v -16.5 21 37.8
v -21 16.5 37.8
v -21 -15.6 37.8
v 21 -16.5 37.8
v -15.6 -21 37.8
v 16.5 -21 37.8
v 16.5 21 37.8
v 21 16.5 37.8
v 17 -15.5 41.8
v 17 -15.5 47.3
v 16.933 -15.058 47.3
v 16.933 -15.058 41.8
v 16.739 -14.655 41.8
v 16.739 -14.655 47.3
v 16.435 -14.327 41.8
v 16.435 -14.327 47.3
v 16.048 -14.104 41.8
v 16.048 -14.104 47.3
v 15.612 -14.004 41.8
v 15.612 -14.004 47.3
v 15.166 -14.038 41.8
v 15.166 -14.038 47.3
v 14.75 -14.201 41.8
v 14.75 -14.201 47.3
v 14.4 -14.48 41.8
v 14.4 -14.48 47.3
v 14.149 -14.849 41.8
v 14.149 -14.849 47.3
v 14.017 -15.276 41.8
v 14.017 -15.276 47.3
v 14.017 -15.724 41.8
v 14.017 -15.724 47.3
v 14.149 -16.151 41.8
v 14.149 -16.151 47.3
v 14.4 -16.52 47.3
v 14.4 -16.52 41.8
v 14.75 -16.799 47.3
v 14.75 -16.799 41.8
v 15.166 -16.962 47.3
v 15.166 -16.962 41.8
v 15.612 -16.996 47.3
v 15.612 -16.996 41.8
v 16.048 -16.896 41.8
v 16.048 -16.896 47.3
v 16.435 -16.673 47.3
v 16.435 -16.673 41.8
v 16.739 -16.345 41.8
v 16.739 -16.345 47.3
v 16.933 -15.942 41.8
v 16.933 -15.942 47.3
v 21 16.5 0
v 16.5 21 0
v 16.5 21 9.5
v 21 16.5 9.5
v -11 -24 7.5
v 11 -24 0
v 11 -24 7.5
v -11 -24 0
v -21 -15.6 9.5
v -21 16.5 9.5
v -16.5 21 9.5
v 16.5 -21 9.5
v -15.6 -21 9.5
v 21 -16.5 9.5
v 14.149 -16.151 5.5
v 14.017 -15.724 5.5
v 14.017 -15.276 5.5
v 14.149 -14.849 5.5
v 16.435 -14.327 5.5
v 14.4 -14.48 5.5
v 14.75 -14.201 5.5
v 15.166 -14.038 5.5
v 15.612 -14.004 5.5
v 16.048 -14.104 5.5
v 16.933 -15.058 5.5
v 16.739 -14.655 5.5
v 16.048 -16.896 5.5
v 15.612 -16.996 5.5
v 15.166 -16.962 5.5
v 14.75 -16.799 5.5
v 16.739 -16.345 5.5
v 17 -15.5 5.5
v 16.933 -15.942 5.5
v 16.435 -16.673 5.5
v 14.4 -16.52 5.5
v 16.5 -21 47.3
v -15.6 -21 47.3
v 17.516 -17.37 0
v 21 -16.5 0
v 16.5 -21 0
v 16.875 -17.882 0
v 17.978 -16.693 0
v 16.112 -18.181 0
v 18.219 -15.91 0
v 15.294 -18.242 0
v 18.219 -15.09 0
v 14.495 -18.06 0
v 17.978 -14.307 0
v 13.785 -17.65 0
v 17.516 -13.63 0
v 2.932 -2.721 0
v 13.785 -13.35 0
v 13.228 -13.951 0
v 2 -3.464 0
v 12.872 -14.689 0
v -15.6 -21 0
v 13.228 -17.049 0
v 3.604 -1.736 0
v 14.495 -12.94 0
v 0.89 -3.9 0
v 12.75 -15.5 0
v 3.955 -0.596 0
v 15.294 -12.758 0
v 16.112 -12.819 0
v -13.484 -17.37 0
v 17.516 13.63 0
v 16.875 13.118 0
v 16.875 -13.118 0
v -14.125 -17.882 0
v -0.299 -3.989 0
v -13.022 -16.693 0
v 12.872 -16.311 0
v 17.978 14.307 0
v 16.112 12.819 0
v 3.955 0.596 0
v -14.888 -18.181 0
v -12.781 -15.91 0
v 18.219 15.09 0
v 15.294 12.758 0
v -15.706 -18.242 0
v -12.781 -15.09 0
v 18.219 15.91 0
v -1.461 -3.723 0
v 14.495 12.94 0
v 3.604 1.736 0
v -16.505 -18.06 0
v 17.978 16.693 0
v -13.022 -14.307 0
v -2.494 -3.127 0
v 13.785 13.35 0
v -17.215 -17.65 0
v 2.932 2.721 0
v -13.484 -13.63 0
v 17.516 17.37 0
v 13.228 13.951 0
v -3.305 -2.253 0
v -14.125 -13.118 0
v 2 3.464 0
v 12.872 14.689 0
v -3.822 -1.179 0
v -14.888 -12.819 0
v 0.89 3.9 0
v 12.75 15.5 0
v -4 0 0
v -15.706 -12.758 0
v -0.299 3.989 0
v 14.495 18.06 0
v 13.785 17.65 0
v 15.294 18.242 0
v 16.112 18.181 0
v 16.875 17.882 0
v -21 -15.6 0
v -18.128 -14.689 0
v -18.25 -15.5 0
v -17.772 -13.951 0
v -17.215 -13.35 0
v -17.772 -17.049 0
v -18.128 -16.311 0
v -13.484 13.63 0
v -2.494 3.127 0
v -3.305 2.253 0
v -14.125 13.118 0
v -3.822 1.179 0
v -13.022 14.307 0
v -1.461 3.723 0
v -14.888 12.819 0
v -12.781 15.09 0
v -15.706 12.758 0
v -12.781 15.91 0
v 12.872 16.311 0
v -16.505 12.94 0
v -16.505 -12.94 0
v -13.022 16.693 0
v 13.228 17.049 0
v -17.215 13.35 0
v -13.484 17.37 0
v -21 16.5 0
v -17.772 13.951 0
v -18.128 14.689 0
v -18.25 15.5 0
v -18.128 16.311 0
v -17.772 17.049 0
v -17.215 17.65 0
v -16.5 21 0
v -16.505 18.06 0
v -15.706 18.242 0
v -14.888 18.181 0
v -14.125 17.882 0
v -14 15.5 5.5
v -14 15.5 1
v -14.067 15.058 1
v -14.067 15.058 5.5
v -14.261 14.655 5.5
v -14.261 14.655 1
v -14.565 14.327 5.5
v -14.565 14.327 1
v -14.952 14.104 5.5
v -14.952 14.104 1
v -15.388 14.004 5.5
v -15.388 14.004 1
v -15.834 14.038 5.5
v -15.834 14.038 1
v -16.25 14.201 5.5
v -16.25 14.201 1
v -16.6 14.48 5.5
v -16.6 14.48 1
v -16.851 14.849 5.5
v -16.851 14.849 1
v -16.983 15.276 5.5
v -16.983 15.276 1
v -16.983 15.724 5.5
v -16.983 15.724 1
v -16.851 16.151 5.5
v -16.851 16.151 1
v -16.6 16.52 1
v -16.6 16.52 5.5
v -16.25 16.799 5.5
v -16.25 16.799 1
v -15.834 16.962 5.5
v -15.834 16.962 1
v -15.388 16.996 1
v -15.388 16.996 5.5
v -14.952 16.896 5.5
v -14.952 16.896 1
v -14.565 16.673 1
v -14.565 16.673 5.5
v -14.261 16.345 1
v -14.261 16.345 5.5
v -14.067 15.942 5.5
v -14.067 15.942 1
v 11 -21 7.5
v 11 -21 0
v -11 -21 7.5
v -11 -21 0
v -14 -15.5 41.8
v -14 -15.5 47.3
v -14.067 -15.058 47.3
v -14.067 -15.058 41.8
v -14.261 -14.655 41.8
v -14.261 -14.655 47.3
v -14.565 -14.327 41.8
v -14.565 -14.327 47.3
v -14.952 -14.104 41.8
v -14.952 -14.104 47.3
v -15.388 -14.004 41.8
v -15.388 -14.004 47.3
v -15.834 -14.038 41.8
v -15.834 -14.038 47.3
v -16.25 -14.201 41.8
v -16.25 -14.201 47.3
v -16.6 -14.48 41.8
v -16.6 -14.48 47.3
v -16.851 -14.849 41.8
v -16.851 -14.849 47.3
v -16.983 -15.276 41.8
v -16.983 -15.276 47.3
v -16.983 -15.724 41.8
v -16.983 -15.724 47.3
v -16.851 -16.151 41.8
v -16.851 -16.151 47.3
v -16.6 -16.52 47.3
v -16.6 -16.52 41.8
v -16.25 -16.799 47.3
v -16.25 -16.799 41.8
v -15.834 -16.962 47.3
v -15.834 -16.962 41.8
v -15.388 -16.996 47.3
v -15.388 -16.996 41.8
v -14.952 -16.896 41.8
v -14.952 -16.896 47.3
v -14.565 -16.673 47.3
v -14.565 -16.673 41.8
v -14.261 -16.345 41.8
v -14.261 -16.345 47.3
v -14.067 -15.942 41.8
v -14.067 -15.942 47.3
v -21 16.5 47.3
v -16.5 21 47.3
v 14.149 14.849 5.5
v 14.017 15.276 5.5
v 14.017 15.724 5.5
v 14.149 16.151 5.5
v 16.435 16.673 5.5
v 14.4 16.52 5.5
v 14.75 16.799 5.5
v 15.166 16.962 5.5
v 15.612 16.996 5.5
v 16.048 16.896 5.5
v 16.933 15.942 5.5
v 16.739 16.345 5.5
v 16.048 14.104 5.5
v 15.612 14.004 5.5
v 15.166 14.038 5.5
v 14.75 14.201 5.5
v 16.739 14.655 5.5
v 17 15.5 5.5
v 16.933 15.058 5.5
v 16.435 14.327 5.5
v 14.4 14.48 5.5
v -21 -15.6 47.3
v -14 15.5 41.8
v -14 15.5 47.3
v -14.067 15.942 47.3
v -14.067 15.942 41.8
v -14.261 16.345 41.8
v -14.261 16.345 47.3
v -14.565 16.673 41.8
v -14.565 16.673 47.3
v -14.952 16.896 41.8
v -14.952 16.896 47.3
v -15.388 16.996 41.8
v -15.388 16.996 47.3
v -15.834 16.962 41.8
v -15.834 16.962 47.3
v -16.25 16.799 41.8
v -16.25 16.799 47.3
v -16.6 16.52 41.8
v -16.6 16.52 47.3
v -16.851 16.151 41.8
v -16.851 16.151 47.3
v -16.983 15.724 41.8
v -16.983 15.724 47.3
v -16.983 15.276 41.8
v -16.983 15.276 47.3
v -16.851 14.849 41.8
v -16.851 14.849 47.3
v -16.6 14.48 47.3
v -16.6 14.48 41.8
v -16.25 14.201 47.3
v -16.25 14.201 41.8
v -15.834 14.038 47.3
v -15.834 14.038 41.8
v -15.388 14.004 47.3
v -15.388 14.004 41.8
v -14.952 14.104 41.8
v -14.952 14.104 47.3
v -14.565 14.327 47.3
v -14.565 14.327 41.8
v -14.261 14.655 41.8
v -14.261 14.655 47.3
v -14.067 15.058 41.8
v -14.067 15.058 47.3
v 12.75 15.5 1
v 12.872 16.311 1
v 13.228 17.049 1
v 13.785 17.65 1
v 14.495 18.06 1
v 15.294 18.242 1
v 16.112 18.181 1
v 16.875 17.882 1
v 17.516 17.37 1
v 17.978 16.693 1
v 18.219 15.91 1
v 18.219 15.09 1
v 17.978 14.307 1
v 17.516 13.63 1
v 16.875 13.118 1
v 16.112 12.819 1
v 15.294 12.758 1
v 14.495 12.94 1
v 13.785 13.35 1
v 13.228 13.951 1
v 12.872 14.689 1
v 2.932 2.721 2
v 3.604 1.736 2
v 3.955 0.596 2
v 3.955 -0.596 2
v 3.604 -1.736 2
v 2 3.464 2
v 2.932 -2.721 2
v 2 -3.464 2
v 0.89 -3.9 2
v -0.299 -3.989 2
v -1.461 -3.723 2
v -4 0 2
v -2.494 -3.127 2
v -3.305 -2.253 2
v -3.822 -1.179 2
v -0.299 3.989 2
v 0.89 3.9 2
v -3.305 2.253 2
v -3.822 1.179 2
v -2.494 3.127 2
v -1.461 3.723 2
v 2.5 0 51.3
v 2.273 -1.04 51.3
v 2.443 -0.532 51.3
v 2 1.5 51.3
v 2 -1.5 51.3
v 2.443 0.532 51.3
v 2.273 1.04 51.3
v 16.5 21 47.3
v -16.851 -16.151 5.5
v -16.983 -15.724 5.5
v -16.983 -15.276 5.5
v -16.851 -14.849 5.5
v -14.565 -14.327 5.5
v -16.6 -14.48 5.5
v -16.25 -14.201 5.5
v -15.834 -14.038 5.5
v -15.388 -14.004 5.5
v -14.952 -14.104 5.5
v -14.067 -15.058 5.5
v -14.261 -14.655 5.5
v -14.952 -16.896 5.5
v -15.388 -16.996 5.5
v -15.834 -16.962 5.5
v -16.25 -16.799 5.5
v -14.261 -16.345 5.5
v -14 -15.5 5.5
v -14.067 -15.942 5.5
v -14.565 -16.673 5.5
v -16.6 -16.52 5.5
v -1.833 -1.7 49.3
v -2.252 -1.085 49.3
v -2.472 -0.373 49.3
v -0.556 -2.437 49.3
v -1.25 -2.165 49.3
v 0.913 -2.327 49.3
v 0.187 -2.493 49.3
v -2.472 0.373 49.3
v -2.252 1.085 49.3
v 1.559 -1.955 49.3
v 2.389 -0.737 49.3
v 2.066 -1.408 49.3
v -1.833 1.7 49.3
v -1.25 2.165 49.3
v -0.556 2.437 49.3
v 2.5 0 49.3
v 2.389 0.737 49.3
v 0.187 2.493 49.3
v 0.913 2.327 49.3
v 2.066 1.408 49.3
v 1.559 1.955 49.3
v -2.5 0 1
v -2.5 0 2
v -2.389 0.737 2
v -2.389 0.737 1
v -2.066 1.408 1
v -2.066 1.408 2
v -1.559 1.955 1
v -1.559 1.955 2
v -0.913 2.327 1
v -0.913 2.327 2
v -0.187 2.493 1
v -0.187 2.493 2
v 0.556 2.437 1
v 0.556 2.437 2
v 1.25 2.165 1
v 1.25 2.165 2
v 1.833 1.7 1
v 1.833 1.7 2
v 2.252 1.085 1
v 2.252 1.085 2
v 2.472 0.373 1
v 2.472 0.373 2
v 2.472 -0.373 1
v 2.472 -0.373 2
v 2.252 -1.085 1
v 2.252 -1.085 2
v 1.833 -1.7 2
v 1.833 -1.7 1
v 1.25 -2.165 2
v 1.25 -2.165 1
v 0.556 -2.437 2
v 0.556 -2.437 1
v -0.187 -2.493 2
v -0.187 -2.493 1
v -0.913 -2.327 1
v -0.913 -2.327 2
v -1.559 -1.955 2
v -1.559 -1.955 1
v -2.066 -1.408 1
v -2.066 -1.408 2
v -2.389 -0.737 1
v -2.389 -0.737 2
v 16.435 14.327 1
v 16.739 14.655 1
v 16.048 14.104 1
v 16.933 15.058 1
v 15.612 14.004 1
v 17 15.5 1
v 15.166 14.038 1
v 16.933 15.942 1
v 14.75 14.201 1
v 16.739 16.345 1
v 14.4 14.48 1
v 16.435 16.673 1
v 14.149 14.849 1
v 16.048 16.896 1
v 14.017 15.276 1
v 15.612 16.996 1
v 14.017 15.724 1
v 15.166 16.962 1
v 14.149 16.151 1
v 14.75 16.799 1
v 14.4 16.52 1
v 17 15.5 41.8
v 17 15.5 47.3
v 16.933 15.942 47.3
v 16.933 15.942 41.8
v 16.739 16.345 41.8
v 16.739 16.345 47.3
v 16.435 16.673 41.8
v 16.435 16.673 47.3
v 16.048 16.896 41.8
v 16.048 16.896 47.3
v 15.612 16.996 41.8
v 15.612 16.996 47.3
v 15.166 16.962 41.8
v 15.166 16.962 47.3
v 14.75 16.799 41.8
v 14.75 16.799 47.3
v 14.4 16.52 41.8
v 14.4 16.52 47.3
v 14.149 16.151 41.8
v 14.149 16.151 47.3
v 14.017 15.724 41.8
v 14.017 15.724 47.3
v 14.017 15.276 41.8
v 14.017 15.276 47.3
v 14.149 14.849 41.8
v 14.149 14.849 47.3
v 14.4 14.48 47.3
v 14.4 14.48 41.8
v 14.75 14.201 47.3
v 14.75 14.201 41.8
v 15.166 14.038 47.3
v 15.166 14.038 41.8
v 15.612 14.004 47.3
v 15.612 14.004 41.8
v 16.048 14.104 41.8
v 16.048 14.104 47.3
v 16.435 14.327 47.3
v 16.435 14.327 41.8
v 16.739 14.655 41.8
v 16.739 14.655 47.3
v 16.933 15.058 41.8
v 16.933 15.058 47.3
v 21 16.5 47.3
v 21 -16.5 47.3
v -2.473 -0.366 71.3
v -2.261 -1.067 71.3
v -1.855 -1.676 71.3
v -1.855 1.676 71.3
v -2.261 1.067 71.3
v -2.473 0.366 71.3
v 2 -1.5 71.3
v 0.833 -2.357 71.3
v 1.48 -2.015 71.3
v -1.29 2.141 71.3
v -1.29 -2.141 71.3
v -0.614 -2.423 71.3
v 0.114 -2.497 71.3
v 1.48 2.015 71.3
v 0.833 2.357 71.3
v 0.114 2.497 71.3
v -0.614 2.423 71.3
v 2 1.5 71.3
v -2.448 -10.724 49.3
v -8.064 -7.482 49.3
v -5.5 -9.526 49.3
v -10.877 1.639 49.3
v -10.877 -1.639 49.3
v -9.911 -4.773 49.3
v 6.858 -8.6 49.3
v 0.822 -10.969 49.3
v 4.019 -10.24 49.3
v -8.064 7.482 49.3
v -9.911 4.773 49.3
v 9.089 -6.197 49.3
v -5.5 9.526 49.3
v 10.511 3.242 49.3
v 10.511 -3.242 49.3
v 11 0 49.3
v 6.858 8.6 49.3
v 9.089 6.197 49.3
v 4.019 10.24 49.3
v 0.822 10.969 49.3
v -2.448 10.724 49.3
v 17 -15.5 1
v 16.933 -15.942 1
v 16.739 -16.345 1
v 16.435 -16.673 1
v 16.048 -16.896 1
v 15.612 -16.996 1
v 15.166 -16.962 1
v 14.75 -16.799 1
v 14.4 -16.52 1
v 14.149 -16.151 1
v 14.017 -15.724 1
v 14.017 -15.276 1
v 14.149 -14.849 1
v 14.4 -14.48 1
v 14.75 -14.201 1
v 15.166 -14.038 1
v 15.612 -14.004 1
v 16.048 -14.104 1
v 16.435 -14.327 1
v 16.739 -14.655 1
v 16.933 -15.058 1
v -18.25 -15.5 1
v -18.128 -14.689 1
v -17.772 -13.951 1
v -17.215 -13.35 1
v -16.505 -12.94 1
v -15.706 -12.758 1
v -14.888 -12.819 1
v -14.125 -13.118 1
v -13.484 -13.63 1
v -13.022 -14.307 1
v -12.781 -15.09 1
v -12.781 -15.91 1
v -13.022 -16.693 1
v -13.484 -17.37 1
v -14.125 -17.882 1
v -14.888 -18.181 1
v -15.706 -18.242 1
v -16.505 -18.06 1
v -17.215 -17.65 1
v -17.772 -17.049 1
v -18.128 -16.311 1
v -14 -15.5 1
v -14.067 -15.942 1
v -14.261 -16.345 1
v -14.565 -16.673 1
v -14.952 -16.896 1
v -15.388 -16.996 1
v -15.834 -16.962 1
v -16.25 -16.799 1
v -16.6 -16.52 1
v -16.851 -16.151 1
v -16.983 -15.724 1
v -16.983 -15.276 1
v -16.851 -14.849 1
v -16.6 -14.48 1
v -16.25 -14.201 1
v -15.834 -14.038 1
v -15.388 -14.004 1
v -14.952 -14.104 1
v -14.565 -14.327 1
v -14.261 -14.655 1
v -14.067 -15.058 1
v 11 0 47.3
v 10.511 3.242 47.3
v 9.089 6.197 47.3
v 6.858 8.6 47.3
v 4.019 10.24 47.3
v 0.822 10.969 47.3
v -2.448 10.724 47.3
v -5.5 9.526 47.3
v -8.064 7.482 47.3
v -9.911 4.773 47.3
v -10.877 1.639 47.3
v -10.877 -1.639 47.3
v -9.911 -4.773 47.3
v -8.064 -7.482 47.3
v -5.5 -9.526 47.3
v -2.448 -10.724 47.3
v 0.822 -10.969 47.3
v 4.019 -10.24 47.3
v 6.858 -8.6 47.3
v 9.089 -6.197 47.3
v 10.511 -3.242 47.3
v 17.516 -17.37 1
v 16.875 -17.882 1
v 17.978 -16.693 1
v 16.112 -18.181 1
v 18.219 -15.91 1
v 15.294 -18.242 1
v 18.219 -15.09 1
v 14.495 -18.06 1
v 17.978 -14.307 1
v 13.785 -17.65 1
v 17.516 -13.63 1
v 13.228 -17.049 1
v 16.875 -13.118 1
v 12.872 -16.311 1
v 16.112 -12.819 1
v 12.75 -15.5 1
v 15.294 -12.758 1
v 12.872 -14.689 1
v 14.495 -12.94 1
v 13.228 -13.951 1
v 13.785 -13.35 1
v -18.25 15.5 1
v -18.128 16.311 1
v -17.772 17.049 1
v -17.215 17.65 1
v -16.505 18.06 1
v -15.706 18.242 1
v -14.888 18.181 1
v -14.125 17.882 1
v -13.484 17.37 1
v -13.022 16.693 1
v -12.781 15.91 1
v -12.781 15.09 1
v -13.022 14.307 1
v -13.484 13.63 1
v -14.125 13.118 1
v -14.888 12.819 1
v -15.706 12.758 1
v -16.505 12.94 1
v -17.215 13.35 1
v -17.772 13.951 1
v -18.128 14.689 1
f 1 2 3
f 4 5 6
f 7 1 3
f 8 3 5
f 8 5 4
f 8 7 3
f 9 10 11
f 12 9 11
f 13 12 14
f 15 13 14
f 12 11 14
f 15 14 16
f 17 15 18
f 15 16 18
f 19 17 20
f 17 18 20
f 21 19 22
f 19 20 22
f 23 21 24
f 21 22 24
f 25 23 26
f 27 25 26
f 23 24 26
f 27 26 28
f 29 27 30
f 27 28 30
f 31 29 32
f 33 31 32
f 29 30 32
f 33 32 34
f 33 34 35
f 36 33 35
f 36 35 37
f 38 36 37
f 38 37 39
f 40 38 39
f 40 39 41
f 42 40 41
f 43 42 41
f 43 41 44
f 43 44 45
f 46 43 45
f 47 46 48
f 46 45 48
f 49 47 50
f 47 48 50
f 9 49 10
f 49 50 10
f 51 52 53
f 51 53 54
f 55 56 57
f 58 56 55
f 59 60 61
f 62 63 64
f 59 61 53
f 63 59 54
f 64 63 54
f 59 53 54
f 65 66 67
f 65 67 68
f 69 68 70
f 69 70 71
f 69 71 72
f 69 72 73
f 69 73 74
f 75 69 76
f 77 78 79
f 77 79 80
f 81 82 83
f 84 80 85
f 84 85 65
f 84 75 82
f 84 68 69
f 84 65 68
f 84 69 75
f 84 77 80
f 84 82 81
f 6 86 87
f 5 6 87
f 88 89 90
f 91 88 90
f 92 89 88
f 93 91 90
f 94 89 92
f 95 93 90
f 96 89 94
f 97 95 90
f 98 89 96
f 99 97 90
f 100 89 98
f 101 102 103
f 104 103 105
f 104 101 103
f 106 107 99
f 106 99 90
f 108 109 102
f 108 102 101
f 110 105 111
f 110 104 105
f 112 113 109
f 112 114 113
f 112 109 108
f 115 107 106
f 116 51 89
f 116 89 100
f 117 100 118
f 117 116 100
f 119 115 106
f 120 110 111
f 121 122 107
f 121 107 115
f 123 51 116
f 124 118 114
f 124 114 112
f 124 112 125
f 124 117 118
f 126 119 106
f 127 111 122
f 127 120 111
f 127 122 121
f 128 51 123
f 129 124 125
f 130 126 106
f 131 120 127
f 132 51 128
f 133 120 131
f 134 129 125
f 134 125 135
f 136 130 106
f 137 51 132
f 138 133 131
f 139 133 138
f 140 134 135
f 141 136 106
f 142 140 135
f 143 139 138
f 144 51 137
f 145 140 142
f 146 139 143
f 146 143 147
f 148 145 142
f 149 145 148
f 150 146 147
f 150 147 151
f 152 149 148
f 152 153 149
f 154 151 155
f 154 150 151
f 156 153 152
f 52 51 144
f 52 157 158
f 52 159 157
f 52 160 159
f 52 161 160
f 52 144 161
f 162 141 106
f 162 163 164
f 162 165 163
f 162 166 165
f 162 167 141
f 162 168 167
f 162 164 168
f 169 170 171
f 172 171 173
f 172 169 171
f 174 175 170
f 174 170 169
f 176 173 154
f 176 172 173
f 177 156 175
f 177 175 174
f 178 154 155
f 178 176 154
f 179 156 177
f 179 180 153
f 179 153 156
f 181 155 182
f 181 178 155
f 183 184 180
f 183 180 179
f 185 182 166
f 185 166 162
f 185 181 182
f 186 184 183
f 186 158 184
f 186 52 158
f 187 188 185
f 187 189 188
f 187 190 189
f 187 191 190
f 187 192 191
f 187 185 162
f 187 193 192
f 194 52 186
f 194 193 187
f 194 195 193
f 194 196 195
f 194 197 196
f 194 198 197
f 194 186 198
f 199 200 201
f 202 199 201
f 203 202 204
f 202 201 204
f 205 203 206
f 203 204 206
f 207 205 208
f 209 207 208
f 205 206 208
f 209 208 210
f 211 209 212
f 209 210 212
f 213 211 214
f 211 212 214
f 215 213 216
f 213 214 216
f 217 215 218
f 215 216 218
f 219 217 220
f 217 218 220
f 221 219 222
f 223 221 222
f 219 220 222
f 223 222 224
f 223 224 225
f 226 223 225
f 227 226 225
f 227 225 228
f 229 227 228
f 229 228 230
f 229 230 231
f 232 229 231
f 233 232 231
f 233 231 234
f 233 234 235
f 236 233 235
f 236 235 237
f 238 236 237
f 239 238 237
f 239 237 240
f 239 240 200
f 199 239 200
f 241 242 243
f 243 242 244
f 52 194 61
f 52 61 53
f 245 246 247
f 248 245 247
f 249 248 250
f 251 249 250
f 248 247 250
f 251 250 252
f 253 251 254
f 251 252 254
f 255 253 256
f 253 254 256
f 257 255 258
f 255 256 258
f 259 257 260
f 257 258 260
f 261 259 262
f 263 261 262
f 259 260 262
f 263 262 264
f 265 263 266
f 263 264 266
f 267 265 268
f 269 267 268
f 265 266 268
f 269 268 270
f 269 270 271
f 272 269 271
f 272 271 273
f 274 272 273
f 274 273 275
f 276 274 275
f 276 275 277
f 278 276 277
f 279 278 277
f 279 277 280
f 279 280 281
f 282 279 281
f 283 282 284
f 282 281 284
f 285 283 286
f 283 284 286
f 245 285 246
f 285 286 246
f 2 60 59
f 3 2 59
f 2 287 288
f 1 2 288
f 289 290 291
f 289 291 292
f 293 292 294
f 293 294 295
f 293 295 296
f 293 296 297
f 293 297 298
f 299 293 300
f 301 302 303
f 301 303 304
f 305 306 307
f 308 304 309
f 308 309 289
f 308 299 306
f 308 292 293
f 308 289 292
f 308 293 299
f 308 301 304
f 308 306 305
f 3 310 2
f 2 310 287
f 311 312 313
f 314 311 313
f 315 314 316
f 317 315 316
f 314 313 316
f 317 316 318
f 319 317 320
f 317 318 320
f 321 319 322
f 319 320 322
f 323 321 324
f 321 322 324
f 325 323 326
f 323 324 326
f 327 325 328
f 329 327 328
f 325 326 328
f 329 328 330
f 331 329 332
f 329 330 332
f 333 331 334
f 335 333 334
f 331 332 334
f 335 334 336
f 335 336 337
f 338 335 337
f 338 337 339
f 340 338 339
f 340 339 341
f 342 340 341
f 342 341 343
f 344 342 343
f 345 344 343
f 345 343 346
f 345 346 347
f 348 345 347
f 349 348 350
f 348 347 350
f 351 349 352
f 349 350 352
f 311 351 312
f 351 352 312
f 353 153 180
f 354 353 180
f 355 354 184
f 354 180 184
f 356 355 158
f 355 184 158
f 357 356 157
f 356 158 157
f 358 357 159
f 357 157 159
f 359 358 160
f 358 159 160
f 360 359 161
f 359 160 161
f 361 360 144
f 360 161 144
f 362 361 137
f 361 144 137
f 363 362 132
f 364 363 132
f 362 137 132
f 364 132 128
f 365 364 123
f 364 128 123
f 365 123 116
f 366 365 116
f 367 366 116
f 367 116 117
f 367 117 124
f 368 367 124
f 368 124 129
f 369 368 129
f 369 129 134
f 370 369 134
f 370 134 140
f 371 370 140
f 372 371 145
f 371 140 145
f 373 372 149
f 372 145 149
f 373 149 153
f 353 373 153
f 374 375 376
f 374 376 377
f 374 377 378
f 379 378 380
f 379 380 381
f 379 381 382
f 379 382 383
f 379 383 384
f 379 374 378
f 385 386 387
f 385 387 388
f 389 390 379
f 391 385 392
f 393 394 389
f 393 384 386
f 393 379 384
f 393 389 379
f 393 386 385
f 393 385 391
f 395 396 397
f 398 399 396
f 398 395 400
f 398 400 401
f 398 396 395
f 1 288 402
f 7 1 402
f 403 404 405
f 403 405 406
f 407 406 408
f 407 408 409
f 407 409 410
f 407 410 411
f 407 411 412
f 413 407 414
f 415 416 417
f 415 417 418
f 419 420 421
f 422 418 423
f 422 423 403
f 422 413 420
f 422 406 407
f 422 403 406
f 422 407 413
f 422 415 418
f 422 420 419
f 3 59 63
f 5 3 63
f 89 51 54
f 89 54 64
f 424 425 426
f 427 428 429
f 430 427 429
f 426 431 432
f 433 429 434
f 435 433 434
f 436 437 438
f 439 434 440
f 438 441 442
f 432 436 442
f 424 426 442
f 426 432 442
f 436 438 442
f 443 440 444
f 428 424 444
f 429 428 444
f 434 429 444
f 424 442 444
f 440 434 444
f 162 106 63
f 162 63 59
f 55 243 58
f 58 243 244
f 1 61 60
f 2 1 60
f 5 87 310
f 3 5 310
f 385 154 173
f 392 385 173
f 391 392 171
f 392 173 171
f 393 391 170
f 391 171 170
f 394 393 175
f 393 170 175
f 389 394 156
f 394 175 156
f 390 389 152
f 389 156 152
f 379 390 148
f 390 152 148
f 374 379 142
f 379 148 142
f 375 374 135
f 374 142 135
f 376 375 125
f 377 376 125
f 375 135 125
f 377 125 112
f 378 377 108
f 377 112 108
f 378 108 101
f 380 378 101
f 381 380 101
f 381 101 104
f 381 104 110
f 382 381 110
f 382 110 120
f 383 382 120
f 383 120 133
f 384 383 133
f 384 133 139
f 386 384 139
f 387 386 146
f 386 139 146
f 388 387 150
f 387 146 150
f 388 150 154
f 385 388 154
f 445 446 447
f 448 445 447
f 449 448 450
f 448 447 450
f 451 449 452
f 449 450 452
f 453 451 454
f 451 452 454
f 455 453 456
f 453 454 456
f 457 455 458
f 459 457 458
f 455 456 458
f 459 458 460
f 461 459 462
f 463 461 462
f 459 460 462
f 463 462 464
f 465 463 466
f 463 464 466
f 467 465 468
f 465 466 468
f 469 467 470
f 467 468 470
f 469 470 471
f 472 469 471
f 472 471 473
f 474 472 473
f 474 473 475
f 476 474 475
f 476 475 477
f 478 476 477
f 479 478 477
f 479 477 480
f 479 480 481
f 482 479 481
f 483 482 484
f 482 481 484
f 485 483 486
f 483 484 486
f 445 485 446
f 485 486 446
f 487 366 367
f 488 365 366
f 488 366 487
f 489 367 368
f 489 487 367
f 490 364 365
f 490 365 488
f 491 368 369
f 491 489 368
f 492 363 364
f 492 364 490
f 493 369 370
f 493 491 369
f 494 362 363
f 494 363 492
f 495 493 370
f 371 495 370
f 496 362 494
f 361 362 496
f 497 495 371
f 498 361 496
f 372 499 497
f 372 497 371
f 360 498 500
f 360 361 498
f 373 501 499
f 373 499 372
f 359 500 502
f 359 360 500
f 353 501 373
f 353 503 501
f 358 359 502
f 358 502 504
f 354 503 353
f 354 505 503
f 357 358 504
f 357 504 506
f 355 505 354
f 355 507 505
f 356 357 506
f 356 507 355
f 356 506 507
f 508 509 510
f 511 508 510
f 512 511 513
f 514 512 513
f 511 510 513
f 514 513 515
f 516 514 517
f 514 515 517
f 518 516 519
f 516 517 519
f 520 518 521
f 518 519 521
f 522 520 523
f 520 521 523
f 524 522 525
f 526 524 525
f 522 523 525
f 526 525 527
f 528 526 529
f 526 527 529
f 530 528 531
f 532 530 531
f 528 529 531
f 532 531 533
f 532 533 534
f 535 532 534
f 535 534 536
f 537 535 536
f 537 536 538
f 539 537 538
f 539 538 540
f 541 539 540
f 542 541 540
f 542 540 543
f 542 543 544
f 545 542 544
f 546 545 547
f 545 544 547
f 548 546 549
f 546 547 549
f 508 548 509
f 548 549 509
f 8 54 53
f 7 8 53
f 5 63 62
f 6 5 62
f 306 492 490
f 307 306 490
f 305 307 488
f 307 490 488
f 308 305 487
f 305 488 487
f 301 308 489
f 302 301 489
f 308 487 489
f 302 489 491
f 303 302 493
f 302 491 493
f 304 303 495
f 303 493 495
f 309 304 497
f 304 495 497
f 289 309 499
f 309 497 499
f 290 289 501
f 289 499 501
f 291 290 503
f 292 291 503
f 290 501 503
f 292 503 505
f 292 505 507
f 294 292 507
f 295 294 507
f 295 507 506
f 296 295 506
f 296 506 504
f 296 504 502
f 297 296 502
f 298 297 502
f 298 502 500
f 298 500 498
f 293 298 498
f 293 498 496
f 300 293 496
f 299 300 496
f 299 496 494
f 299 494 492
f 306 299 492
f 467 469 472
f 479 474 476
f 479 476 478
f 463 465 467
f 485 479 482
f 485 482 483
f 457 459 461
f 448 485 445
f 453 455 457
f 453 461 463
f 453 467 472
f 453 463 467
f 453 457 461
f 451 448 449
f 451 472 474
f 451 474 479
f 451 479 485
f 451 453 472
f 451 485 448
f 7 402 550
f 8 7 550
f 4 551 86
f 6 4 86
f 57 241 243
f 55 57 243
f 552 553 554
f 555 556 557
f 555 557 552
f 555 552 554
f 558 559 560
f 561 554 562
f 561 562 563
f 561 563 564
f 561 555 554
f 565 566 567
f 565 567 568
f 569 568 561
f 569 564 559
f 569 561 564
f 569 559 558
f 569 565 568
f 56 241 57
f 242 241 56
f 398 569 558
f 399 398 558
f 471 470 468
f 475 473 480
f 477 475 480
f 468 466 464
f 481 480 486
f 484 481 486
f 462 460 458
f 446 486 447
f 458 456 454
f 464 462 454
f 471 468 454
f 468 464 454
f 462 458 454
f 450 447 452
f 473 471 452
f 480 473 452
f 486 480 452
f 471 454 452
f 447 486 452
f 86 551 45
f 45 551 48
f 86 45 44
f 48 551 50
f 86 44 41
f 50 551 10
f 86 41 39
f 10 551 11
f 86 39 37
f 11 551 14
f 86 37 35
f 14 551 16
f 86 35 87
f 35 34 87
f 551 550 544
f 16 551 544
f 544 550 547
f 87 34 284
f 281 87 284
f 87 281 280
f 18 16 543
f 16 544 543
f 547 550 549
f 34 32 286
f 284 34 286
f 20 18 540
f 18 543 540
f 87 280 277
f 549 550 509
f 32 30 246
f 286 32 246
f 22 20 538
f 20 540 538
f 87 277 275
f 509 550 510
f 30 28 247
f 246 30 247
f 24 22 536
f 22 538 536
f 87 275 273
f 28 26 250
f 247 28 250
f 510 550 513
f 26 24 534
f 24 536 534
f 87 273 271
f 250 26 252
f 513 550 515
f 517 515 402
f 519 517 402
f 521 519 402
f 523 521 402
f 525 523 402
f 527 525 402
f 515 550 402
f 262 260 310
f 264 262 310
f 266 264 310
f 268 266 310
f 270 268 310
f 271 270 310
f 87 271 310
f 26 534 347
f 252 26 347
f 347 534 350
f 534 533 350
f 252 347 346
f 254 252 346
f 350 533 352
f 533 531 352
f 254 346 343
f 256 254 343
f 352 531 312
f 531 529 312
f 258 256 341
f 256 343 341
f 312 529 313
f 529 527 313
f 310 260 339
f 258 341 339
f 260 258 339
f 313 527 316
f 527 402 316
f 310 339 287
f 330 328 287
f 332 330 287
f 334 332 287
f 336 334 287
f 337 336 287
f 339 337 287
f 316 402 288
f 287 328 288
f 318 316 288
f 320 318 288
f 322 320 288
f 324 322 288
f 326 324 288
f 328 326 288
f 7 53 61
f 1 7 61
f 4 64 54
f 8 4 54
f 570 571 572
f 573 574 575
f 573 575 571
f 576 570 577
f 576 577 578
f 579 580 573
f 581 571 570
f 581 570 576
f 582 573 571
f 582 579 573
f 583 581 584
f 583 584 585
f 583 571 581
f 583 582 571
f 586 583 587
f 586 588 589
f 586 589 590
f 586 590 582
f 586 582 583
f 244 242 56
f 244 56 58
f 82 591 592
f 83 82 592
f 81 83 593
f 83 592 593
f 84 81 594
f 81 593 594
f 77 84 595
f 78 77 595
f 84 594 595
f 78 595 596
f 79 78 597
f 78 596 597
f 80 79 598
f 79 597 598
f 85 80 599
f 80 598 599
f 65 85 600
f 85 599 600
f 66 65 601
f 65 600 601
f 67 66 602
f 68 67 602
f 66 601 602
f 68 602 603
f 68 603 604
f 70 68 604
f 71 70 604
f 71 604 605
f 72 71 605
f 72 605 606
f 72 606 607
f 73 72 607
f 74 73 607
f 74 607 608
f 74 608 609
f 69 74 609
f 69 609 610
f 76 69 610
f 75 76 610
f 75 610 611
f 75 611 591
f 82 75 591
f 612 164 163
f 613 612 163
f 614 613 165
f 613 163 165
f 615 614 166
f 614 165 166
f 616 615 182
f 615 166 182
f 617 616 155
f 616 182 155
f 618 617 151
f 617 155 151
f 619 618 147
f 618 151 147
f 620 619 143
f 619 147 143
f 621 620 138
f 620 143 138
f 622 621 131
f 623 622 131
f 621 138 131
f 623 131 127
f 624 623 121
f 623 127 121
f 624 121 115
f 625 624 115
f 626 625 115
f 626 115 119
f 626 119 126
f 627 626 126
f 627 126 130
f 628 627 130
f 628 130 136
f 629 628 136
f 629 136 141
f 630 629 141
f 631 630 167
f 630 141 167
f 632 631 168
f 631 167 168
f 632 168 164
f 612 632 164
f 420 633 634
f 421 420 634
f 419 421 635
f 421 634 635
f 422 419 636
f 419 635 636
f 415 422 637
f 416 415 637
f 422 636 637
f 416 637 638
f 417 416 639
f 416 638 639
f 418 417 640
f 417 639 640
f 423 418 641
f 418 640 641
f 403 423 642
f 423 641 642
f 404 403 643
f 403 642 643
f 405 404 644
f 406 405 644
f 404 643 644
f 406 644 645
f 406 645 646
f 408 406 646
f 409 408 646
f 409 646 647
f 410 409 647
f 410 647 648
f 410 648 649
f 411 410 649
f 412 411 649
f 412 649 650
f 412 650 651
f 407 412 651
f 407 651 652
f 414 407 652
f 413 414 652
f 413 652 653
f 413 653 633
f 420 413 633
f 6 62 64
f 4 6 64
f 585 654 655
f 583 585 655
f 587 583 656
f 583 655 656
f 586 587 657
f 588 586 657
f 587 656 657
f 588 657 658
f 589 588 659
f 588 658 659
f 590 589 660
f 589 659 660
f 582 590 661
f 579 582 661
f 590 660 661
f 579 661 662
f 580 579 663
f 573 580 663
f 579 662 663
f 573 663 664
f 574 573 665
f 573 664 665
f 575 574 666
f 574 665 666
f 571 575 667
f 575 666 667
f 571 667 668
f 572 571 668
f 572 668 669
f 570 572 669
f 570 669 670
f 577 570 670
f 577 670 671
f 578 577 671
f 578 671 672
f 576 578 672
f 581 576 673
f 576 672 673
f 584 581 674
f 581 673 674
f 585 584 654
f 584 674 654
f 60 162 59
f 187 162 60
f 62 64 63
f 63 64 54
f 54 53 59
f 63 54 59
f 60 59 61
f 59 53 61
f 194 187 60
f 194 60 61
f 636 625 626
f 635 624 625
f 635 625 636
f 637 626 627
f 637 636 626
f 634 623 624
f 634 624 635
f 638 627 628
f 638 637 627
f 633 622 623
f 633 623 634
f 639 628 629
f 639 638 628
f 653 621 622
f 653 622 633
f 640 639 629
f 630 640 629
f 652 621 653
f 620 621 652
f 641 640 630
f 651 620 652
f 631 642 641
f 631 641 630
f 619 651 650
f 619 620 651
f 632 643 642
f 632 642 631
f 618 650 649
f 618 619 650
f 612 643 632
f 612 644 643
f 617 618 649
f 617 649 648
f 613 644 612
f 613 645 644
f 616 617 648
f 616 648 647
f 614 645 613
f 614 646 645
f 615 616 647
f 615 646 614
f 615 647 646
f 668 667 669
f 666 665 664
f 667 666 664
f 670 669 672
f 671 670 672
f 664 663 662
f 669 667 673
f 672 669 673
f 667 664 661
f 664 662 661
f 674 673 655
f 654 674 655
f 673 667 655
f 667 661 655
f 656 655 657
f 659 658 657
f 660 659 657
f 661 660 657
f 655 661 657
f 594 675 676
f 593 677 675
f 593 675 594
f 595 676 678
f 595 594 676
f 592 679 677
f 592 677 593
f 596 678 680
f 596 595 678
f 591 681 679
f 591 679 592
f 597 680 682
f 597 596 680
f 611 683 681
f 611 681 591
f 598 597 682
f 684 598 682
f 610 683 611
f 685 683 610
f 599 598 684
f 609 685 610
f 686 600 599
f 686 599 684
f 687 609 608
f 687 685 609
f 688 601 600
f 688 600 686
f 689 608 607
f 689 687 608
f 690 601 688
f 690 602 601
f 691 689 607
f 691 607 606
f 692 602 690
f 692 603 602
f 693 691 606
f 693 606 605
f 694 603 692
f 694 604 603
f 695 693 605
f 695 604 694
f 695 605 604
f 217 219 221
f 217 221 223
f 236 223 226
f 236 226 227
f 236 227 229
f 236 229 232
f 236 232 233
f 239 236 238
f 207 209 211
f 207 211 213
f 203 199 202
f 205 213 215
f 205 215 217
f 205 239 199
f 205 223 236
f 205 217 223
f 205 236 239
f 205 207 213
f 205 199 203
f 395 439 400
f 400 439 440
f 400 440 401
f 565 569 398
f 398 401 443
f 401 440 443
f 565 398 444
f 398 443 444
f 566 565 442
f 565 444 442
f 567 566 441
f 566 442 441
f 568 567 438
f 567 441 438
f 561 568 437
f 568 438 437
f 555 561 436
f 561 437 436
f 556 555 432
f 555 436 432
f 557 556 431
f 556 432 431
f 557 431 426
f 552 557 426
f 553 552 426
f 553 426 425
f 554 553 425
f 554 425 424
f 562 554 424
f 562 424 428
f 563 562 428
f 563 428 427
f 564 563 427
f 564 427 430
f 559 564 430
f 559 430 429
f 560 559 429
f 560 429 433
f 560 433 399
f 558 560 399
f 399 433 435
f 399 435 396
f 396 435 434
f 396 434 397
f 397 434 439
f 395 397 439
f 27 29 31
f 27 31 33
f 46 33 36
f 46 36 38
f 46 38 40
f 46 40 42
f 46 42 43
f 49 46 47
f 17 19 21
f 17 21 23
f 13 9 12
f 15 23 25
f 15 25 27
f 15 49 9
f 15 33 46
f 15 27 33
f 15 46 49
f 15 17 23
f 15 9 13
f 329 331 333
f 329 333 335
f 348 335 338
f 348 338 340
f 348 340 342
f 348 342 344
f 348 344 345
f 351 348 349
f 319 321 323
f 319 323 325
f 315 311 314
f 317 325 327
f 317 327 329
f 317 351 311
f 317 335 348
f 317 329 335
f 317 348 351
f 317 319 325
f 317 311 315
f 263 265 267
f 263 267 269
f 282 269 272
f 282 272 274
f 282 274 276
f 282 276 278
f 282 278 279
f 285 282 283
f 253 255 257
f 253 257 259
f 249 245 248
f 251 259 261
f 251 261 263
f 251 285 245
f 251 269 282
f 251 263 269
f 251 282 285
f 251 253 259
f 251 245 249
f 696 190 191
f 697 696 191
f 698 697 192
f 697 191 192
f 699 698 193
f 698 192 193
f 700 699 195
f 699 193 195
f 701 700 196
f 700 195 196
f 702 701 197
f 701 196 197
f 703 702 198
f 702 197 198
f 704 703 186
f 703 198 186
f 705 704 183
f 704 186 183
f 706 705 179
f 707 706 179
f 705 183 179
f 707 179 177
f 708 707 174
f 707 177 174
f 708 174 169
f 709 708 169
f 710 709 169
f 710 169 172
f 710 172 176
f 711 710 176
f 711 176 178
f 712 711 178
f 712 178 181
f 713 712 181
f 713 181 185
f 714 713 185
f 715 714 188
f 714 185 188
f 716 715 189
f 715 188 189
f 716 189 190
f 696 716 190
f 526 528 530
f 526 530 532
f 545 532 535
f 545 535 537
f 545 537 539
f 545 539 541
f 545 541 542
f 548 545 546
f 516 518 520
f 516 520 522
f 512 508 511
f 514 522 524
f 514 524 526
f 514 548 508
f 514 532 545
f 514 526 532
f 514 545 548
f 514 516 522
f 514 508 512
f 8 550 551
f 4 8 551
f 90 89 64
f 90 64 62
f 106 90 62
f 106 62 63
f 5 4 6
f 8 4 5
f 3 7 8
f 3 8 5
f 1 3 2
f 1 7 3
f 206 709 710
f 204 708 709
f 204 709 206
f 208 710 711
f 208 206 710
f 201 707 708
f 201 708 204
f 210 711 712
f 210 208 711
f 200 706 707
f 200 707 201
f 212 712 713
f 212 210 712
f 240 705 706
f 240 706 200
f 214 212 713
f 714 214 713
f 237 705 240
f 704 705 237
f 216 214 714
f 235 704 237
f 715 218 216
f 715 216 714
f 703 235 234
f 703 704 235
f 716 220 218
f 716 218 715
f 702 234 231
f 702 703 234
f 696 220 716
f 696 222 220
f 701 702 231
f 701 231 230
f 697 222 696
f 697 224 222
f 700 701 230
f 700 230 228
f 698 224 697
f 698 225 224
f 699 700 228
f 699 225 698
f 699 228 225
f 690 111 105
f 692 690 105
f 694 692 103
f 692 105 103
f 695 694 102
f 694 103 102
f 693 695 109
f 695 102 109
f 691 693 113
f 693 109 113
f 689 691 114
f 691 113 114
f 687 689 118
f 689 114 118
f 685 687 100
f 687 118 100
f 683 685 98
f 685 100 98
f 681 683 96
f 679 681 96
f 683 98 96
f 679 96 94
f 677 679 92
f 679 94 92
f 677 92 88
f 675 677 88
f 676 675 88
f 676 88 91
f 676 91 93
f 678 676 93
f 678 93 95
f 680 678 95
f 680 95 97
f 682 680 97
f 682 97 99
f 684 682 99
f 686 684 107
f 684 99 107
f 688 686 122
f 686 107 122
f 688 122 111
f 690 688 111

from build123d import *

# Parameters (mm, degrees)
BOSS_EXTRUDE1_DEPTH  = 9.5
BOSS_EXTRUDE7_DEPTH  = 9.5
EXTRUDE_5_DEPTH      = 28.3
SKETCH11_R           = 11
BOSS_EXTRUDE9_DEPTH  = 2
SKETCH10_R           = 1.5
CUT_EXTRUDE3_DEPTH   = 5.5
SKETCH12_R           = 2.5
BOSS_EXTRUDE10_DEPTH = 22
SKETCH14_R           = 1.5
CUT_EXTRUDE5_DEPTH   = 5.5
SKETCH16_R           = 4
CUT_EXTRUDE6_DEPTH   = 2
SKETCH17_R           = 2.5
BOSS_EXTRUDE11_DEPTH = 1
SKETCH18_R           = 2.75
CUT_EXTRUDE7_DEPTH   = 1
SKETCH_3_W           = 22
SKETCH_3_H           = 7.5
EXTRUDE_4_DEPTH      = 3
CUT_EXTRUDE_1_DEPTH  = 20


with BuildPart() as part:
    # Sketch1 → Boss-Extrude1 (new body)
    with BuildSketch(Plane.XY):
        Polygon((-21, 16.5), (-16.5, 21), (16.5, 21), (21, 16.5), (21, -16.5), (16.5, -21), (-15.6, -21), (-21, -15.6), align=None)
    extrude(amount=BOSS_EXTRUDE1_DEPTH)

    # Sketch14 → Cut-Extrude5 (cut)
    with BuildSketch(Plane(origin=(0, 0, 0), x_dir=(-1, 0, 0), z_dir=(0, 0, -1))):
        with Locations(Location((15.5, -15.5, 0), (0, 0, 180))):
            Circle(SKETCH14_R)
        with Locations(Location((-15.5, -15.5, 0), (0, 0, 180))):
            Circle(SKETCH14_R)
        with Locations(Location((-15.5, 15.5, 0), (0, 0, 180))):
            Circle(SKETCH14_R)
        with Locations(Location((15.5, 15.5, 0), (0, 0, 180))):
            Circle(SKETCH14_R)
    extrude(amount=-CUT_EXTRUDE5_DEPTH, mode=Mode.SUBTRACT)

    # Sketch16 → Cut-Extrude6 (cut)
    with BuildSketch(Plane(origin=(0, 0, 0), x_dir=(-1, 0, 0), z_dir=(0, 0, -1))):
        Circle(SKETCH16_R)
    extrude(amount=-CUT_EXTRUDE6_DEPTH, mode=Mode.SUBTRACT)

    # Sketch18 → Cut-Extrude7 (cut)
    with BuildSketch(Plane(origin=(0, 0, 0), x_dir=(-1, 0, 0), z_dir=(0, 0, -1))):
        with Locations((15.5, -15.5)):
            Circle(SKETCH18_R)
        with Locations((-15.5, -15.5)):
            Circle(SKETCH18_R)
        with Locations((-15.5, 15.5)):
            Circle(SKETCH18_R)
        with Locations((15.5, 15.5)):
            Circle(SKETCH18_R)
    extrude(amount=-CUT_EXTRUDE7_DEPTH, mode=Mode.SUBTRACT)


with BuildPart() as body_2:
    # Sketch8 → Boss-Extrude7 (new body)
    with BuildSketch(Plane(origin=(0, 0, 47.3), x_dir=(-1, 0, 0), z_dir=(0, 0, -1))):
        Polygon((21, 16.5), (16.5, 21), (-16.5, 21), (-21, 16.5), (-21, -16.5), (-16.5, -21), (15.6, -21), (21, -15.6), align=None)
    extrude(amount=BOSS_EXTRUDE7_DEPTH)

    # Sketch10 → Cut-Extrude3 (cut)
    with BuildSketch(Plane.XY.offset(47.3)):
        with Locations((-15.5, 15.5)):
            Circle(SKETCH10_R)
        with Locations((15.5, 15.5)):
            Circle(SKETCH10_R)
        with Locations((15.5, -15.5)):
            Circle(SKETCH10_R)
        with Locations((-15.5, -15.5)):
            Circle(SKETCH10_R)
    extrude(amount=-CUT_EXTRUDE3_DEPTH, mode=Mode.SUBTRACT)


with BuildPart() as body_3:
    # 草图6 → 凸台-拉伸5 (new body)
    with BuildSketch(Plane.XY.offset(9.5)):
        Polygon((16.5, 21), (-16.5, 21), (-21, 16.5), (-21, -15.6), (-15.6, -21), (16.5, -21), (21, -16.5), (21, 16.5), align=None)
    extrude(amount=EXTRUDE_5_DEPTH)


with BuildPart() as body_4:
    # Sketch11 → Boss-Extrude9 (new body)
    with BuildSketch(Plane.XY.offset(47.3)):
        Circle(SKETCH11_R)
    extrude(amount=BOSS_EXTRUDE9_DEPTH)


with BuildPart() as body_5:
    # Sketch12 → Boss-Extrude10 (new body)
    with BuildSketch(Plane.XY.offset(49.3)):
        Circle(SKETCH12_R)
    extrude(amount=BOSS_EXTRUDE10_DEPTH)

    # 草图5 → 切除-拉伸1 (cut)
    with BuildSketch(Plane.XY.offset(71.3)):
        with BuildLine():
            Line((2, 1.5), (2, -1.5))
            ThreePointArc((2, -1.5), (2.5, 0), (2, 1.5))
        make_face()
    extrude(amount=-CUT_EXTRUDE_1_DEPTH, mode=Mode.SUBTRACT)


with BuildPart() as body_6:
    # Sketch17 → Boss-Extrude11 (new body)
    with BuildSketch(Plane(origin=(0, 0, 2), x_dir=(-1, 0, 0), z_dir=(0, 0, -1))):
        Circle(SKETCH17_R)
    extrude(amount=BOSS_EXTRUDE11_DEPTH)


with BuildPart() as body_7:
    # 草图3 → 凸台-拉伸4 (new body)
    with BuildSketch(Plane(origin=(0, -21, 0), x_dir=(-1, 0, 0), z_dir=(0, -1, 0))):
        with Locations((0, -3.75)):
            Rectangle(SKETCH_3_W, SKETCH_3_H)
    extrude(amount=EXTRUDE_4_DEPTH)


solid = Compound([part.part, body_2.part, body_3.part, body_4.part, body_5.part, body_6.part, body_7.part])
